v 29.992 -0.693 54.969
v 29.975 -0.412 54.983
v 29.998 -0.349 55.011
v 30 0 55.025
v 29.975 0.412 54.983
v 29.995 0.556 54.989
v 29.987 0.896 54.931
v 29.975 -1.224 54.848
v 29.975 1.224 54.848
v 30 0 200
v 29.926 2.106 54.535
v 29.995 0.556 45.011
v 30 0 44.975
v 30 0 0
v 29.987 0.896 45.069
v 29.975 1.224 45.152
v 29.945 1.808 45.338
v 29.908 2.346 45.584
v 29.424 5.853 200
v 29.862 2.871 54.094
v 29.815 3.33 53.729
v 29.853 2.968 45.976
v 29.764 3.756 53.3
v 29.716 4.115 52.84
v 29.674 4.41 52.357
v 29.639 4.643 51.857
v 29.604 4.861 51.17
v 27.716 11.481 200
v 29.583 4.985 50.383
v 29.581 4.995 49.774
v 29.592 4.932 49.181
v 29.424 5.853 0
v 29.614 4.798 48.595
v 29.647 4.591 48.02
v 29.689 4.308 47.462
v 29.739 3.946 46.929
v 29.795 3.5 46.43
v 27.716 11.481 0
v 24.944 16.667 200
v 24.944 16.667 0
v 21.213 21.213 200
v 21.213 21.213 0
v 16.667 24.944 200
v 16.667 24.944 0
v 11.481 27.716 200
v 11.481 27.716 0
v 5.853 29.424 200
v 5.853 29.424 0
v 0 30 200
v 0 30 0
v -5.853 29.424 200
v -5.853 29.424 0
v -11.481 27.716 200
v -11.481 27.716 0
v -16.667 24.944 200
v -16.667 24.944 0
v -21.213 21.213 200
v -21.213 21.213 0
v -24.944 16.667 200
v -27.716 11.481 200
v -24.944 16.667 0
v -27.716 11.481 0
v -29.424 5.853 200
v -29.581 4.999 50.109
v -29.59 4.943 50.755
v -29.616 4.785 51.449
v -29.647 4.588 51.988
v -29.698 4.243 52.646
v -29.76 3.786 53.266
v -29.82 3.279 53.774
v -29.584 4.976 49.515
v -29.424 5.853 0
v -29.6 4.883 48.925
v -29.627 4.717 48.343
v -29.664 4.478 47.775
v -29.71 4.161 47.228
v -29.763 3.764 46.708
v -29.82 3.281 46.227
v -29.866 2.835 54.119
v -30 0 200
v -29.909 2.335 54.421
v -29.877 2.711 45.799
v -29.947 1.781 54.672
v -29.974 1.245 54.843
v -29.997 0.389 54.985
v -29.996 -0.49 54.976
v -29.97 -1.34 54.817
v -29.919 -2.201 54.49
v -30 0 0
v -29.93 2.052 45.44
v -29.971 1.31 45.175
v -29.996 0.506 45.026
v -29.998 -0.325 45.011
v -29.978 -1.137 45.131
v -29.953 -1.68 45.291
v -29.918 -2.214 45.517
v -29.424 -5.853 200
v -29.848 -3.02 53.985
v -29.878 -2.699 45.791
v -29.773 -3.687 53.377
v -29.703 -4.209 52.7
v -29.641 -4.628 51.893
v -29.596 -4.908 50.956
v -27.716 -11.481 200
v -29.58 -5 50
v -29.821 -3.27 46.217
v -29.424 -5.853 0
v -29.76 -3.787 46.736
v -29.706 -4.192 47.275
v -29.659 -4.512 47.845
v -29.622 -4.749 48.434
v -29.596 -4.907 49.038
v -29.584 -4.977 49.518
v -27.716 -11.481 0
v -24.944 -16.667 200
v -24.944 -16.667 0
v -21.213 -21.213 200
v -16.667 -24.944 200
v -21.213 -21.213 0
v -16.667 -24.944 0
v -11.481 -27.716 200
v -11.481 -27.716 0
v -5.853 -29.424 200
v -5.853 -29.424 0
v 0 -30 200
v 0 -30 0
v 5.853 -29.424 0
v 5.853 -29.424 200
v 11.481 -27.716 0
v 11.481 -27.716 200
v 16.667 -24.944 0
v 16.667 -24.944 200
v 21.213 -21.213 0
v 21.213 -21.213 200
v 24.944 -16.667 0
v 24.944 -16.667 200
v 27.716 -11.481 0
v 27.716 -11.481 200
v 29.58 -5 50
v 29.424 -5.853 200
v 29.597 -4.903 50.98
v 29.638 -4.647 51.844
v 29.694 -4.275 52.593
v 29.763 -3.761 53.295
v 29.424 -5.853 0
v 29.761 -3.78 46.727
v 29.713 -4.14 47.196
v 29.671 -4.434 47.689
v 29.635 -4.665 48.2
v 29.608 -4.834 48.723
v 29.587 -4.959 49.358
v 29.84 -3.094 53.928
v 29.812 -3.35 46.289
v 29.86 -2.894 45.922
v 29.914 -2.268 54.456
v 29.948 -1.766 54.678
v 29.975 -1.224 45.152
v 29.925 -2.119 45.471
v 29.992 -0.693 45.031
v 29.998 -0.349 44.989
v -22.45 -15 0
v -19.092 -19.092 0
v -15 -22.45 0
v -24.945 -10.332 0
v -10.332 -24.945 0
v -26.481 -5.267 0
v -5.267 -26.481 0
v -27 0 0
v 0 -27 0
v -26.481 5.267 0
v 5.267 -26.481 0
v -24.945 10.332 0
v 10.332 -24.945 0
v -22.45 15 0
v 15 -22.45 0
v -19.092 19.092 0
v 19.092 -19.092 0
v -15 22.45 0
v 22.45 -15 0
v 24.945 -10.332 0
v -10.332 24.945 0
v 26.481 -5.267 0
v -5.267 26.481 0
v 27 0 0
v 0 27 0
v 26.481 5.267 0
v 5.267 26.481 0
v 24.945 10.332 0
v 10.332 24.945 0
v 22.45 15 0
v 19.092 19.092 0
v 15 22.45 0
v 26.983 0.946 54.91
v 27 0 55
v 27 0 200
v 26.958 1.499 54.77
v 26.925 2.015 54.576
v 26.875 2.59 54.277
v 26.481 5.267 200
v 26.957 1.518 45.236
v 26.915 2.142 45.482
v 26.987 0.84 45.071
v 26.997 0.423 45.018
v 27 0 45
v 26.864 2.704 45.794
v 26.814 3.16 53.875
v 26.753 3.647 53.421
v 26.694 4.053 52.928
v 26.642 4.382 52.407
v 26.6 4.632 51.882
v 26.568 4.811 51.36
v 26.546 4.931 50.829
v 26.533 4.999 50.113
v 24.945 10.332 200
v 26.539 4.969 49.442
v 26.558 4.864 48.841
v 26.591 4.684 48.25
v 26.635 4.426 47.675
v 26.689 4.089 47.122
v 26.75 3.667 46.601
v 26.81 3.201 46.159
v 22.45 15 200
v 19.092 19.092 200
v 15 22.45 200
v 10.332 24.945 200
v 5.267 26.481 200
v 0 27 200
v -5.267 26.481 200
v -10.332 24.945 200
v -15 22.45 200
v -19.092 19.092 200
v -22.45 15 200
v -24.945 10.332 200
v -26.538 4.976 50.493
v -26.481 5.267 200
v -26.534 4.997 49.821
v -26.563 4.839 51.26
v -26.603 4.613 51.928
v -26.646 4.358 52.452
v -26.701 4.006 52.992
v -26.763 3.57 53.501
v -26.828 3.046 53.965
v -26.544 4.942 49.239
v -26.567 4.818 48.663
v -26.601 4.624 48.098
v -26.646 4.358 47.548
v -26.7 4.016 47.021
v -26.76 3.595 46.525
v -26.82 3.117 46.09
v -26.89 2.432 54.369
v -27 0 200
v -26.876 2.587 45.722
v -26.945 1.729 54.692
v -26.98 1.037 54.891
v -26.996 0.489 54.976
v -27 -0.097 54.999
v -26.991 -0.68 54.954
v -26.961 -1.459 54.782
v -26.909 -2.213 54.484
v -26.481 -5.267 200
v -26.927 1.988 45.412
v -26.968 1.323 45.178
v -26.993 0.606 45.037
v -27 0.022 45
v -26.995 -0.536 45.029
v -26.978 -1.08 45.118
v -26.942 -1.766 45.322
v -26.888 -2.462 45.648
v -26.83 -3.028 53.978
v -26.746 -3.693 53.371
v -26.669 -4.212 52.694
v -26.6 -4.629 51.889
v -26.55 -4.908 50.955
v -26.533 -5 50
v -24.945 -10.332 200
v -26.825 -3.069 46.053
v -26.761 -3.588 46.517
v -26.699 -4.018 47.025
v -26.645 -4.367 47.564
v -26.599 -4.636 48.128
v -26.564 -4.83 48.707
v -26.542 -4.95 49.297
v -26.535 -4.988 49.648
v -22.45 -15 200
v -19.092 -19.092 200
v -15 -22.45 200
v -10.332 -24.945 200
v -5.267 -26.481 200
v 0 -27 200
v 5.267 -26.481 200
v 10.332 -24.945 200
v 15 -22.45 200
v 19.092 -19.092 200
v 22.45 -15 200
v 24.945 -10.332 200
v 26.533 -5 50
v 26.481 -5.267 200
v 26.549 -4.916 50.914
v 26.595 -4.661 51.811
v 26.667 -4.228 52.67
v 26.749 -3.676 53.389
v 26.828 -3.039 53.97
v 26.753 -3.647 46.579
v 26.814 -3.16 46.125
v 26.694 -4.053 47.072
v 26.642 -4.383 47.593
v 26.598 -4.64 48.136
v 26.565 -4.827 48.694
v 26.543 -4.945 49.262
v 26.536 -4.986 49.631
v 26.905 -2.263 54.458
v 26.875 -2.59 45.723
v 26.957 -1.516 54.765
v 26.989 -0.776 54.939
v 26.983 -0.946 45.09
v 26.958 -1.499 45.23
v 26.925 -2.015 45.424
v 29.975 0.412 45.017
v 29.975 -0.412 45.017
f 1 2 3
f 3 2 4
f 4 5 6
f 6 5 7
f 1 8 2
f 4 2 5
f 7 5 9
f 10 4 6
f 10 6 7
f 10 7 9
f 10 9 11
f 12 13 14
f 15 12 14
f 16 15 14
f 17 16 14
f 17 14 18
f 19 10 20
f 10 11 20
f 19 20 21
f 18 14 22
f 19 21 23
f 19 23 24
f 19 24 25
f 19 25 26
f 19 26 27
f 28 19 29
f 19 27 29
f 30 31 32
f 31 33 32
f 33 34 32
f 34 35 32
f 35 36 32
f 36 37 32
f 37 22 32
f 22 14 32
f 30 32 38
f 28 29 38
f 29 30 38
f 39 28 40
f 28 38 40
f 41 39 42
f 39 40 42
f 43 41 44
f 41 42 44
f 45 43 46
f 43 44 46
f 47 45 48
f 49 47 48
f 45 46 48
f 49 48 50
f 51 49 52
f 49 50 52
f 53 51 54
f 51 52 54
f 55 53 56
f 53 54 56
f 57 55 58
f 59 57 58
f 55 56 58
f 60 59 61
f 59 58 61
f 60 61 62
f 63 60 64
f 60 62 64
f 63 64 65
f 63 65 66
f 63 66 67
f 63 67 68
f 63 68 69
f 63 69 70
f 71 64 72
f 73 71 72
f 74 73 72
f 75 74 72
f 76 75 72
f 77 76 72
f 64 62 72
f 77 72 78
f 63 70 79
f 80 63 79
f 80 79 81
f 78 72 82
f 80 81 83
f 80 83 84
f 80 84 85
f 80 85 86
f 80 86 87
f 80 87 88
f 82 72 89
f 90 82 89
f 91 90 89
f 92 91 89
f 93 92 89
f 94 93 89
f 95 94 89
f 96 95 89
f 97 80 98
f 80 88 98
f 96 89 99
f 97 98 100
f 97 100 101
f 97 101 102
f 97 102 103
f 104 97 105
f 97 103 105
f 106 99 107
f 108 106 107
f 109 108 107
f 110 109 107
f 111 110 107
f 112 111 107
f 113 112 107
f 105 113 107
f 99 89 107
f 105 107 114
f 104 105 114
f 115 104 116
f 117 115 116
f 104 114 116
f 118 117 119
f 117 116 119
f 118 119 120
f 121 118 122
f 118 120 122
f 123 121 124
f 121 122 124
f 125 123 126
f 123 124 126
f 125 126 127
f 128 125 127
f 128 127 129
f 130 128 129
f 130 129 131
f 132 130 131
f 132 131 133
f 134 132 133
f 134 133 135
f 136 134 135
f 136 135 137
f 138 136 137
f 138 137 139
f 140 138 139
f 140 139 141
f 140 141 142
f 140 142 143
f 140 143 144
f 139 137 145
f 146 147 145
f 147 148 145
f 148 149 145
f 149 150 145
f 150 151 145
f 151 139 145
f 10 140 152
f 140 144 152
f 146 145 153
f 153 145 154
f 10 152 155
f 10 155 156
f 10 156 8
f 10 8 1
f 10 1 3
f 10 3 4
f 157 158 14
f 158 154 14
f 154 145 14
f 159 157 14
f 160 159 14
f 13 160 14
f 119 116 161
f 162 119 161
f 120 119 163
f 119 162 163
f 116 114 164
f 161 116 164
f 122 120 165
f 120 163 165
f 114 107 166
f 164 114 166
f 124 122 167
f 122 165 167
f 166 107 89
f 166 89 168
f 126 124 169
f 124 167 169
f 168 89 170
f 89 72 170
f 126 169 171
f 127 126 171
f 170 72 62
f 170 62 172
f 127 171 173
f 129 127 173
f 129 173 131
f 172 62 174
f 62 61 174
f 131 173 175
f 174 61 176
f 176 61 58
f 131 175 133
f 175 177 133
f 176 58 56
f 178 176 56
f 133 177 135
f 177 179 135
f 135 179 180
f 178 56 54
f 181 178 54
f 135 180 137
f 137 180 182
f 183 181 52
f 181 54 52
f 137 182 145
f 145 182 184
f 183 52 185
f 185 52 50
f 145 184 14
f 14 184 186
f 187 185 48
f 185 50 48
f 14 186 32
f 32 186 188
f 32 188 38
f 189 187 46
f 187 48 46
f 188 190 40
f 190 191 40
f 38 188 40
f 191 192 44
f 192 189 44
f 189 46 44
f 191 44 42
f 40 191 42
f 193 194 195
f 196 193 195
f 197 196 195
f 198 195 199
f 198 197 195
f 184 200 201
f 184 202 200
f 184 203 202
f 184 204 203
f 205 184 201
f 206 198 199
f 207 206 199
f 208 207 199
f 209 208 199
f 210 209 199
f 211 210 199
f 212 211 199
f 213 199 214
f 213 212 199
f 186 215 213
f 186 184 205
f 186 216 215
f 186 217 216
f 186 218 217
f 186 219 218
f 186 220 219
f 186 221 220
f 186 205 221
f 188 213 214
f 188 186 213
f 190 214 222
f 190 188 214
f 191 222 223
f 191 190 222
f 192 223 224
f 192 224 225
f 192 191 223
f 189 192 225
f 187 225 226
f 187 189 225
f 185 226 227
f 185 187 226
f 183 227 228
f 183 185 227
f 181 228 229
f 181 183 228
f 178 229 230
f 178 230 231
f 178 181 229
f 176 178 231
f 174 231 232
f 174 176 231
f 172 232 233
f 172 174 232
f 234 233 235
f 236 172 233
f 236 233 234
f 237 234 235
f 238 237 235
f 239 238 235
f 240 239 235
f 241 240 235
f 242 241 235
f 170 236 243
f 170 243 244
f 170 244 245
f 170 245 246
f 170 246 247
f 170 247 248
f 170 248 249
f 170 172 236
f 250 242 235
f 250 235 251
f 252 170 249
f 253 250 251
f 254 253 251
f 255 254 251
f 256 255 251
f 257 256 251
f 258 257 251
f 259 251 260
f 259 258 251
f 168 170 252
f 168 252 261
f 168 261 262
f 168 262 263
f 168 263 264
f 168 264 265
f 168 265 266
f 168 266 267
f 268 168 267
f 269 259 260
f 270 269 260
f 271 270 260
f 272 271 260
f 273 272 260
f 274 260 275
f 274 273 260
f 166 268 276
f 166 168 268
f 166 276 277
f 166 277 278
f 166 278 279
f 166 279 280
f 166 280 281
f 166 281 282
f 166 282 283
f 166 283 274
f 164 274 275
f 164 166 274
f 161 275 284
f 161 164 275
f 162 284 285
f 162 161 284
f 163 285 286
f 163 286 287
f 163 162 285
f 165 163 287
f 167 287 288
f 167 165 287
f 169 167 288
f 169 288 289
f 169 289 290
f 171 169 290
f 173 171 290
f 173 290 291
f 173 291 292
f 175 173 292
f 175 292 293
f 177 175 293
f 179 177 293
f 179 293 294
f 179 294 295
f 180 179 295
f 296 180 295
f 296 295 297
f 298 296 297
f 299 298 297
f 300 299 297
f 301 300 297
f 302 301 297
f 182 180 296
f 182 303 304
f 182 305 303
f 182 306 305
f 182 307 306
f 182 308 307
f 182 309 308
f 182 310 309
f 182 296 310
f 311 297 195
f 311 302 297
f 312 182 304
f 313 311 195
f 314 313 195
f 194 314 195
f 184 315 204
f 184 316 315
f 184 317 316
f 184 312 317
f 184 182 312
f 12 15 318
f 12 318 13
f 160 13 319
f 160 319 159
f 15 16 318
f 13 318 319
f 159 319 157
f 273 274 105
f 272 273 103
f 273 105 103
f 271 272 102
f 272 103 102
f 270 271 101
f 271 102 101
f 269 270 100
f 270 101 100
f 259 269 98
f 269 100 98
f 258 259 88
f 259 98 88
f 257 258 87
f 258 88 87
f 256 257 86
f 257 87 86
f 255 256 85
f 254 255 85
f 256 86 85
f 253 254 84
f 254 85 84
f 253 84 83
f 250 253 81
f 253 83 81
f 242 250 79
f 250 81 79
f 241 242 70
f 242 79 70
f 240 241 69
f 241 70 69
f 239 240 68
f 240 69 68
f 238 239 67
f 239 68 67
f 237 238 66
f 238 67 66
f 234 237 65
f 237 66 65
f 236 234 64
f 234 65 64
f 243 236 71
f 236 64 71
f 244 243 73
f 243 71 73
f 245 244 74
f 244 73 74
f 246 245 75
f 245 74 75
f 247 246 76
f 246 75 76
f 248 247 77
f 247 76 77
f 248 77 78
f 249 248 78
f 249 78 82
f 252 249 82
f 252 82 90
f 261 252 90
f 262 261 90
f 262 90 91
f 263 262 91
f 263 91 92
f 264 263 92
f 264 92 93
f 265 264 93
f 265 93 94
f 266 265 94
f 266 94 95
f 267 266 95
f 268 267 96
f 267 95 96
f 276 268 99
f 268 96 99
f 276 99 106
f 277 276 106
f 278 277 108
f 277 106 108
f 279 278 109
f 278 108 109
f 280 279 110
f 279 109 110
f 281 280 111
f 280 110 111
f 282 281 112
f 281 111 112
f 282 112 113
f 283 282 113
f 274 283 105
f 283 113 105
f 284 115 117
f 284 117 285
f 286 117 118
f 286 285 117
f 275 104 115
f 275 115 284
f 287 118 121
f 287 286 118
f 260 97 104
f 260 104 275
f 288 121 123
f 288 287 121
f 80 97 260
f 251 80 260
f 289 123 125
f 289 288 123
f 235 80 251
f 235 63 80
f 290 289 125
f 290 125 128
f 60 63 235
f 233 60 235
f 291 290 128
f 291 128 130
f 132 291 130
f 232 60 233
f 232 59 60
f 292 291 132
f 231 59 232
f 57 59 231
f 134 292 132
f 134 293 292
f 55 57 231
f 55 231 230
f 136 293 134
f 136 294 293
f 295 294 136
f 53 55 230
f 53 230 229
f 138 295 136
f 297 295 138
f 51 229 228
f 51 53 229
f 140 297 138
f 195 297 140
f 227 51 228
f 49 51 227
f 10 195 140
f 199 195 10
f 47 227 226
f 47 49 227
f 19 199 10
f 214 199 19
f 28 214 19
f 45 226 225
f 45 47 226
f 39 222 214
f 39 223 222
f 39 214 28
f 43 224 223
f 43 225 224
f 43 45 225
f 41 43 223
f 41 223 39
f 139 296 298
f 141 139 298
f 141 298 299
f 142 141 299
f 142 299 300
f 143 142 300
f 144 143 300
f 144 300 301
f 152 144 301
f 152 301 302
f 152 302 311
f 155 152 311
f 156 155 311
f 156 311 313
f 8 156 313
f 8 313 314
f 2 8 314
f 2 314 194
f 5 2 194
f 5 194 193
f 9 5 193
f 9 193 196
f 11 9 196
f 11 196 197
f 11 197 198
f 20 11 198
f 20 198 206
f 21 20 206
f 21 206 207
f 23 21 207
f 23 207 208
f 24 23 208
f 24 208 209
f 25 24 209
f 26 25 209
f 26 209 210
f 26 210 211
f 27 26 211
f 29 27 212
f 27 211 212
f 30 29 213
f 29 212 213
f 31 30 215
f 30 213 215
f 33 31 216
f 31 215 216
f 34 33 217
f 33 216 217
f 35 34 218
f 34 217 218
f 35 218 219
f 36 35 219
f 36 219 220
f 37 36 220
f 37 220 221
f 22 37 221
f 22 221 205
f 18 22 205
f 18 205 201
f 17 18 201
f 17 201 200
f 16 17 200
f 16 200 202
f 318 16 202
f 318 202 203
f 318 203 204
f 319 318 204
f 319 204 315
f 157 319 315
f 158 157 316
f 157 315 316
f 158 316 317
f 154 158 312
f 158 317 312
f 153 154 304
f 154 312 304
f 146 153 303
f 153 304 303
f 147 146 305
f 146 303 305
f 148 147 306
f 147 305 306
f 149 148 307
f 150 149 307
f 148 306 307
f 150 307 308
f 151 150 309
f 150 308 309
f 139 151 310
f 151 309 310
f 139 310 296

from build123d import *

# Parameters (mm, degrees)
SZKIC2_R                              = 30
SZKIC2_R_2                            = 27
DODANIE_WYCI_GNI_CIE4_DEPTH           = 200
OTWORY_USTALAJ_CE_10_0MM1_D           = 10
OTWORY_USTALAJ_CE_10_0MM1_CSINK_D     = 10.05
OTWORY_USTALAJ_CE_10_0MM1_CSINK_ANGLE = 90


with BuildPart() as part:
    # Szkic2 → Dodanie-wyciągnięcie4 (new body)
    with BuildSketch(Plane.XY):
        Circle(SZKIC2_R)
        Circle(SZKIC2_R_2, mode=Mode.SUBTRACT)
    extrude(amount=DODANIE_WYCI_GNI_CIE4_DEPTH)

    # Otwory ustalające Ø10.0mm1 (through all)
    with Locations(Plane(origin=(30, 0, 50), x_dir=(0, 1, 0), z_dir=(1, 0, 0))):
        with Locations((0, 0)):
            CounterSinkHole(OTWORY_USTALAJ_CE_10_0MM1_D / 2, OTWORY_USTALAJ_CE_10_0MM1_CSINK_D / 2, counter_sink_angle=OTWORY_USTALAJ_CE_10_0MM1_CSINK_ANGLE)


solid = part.part
